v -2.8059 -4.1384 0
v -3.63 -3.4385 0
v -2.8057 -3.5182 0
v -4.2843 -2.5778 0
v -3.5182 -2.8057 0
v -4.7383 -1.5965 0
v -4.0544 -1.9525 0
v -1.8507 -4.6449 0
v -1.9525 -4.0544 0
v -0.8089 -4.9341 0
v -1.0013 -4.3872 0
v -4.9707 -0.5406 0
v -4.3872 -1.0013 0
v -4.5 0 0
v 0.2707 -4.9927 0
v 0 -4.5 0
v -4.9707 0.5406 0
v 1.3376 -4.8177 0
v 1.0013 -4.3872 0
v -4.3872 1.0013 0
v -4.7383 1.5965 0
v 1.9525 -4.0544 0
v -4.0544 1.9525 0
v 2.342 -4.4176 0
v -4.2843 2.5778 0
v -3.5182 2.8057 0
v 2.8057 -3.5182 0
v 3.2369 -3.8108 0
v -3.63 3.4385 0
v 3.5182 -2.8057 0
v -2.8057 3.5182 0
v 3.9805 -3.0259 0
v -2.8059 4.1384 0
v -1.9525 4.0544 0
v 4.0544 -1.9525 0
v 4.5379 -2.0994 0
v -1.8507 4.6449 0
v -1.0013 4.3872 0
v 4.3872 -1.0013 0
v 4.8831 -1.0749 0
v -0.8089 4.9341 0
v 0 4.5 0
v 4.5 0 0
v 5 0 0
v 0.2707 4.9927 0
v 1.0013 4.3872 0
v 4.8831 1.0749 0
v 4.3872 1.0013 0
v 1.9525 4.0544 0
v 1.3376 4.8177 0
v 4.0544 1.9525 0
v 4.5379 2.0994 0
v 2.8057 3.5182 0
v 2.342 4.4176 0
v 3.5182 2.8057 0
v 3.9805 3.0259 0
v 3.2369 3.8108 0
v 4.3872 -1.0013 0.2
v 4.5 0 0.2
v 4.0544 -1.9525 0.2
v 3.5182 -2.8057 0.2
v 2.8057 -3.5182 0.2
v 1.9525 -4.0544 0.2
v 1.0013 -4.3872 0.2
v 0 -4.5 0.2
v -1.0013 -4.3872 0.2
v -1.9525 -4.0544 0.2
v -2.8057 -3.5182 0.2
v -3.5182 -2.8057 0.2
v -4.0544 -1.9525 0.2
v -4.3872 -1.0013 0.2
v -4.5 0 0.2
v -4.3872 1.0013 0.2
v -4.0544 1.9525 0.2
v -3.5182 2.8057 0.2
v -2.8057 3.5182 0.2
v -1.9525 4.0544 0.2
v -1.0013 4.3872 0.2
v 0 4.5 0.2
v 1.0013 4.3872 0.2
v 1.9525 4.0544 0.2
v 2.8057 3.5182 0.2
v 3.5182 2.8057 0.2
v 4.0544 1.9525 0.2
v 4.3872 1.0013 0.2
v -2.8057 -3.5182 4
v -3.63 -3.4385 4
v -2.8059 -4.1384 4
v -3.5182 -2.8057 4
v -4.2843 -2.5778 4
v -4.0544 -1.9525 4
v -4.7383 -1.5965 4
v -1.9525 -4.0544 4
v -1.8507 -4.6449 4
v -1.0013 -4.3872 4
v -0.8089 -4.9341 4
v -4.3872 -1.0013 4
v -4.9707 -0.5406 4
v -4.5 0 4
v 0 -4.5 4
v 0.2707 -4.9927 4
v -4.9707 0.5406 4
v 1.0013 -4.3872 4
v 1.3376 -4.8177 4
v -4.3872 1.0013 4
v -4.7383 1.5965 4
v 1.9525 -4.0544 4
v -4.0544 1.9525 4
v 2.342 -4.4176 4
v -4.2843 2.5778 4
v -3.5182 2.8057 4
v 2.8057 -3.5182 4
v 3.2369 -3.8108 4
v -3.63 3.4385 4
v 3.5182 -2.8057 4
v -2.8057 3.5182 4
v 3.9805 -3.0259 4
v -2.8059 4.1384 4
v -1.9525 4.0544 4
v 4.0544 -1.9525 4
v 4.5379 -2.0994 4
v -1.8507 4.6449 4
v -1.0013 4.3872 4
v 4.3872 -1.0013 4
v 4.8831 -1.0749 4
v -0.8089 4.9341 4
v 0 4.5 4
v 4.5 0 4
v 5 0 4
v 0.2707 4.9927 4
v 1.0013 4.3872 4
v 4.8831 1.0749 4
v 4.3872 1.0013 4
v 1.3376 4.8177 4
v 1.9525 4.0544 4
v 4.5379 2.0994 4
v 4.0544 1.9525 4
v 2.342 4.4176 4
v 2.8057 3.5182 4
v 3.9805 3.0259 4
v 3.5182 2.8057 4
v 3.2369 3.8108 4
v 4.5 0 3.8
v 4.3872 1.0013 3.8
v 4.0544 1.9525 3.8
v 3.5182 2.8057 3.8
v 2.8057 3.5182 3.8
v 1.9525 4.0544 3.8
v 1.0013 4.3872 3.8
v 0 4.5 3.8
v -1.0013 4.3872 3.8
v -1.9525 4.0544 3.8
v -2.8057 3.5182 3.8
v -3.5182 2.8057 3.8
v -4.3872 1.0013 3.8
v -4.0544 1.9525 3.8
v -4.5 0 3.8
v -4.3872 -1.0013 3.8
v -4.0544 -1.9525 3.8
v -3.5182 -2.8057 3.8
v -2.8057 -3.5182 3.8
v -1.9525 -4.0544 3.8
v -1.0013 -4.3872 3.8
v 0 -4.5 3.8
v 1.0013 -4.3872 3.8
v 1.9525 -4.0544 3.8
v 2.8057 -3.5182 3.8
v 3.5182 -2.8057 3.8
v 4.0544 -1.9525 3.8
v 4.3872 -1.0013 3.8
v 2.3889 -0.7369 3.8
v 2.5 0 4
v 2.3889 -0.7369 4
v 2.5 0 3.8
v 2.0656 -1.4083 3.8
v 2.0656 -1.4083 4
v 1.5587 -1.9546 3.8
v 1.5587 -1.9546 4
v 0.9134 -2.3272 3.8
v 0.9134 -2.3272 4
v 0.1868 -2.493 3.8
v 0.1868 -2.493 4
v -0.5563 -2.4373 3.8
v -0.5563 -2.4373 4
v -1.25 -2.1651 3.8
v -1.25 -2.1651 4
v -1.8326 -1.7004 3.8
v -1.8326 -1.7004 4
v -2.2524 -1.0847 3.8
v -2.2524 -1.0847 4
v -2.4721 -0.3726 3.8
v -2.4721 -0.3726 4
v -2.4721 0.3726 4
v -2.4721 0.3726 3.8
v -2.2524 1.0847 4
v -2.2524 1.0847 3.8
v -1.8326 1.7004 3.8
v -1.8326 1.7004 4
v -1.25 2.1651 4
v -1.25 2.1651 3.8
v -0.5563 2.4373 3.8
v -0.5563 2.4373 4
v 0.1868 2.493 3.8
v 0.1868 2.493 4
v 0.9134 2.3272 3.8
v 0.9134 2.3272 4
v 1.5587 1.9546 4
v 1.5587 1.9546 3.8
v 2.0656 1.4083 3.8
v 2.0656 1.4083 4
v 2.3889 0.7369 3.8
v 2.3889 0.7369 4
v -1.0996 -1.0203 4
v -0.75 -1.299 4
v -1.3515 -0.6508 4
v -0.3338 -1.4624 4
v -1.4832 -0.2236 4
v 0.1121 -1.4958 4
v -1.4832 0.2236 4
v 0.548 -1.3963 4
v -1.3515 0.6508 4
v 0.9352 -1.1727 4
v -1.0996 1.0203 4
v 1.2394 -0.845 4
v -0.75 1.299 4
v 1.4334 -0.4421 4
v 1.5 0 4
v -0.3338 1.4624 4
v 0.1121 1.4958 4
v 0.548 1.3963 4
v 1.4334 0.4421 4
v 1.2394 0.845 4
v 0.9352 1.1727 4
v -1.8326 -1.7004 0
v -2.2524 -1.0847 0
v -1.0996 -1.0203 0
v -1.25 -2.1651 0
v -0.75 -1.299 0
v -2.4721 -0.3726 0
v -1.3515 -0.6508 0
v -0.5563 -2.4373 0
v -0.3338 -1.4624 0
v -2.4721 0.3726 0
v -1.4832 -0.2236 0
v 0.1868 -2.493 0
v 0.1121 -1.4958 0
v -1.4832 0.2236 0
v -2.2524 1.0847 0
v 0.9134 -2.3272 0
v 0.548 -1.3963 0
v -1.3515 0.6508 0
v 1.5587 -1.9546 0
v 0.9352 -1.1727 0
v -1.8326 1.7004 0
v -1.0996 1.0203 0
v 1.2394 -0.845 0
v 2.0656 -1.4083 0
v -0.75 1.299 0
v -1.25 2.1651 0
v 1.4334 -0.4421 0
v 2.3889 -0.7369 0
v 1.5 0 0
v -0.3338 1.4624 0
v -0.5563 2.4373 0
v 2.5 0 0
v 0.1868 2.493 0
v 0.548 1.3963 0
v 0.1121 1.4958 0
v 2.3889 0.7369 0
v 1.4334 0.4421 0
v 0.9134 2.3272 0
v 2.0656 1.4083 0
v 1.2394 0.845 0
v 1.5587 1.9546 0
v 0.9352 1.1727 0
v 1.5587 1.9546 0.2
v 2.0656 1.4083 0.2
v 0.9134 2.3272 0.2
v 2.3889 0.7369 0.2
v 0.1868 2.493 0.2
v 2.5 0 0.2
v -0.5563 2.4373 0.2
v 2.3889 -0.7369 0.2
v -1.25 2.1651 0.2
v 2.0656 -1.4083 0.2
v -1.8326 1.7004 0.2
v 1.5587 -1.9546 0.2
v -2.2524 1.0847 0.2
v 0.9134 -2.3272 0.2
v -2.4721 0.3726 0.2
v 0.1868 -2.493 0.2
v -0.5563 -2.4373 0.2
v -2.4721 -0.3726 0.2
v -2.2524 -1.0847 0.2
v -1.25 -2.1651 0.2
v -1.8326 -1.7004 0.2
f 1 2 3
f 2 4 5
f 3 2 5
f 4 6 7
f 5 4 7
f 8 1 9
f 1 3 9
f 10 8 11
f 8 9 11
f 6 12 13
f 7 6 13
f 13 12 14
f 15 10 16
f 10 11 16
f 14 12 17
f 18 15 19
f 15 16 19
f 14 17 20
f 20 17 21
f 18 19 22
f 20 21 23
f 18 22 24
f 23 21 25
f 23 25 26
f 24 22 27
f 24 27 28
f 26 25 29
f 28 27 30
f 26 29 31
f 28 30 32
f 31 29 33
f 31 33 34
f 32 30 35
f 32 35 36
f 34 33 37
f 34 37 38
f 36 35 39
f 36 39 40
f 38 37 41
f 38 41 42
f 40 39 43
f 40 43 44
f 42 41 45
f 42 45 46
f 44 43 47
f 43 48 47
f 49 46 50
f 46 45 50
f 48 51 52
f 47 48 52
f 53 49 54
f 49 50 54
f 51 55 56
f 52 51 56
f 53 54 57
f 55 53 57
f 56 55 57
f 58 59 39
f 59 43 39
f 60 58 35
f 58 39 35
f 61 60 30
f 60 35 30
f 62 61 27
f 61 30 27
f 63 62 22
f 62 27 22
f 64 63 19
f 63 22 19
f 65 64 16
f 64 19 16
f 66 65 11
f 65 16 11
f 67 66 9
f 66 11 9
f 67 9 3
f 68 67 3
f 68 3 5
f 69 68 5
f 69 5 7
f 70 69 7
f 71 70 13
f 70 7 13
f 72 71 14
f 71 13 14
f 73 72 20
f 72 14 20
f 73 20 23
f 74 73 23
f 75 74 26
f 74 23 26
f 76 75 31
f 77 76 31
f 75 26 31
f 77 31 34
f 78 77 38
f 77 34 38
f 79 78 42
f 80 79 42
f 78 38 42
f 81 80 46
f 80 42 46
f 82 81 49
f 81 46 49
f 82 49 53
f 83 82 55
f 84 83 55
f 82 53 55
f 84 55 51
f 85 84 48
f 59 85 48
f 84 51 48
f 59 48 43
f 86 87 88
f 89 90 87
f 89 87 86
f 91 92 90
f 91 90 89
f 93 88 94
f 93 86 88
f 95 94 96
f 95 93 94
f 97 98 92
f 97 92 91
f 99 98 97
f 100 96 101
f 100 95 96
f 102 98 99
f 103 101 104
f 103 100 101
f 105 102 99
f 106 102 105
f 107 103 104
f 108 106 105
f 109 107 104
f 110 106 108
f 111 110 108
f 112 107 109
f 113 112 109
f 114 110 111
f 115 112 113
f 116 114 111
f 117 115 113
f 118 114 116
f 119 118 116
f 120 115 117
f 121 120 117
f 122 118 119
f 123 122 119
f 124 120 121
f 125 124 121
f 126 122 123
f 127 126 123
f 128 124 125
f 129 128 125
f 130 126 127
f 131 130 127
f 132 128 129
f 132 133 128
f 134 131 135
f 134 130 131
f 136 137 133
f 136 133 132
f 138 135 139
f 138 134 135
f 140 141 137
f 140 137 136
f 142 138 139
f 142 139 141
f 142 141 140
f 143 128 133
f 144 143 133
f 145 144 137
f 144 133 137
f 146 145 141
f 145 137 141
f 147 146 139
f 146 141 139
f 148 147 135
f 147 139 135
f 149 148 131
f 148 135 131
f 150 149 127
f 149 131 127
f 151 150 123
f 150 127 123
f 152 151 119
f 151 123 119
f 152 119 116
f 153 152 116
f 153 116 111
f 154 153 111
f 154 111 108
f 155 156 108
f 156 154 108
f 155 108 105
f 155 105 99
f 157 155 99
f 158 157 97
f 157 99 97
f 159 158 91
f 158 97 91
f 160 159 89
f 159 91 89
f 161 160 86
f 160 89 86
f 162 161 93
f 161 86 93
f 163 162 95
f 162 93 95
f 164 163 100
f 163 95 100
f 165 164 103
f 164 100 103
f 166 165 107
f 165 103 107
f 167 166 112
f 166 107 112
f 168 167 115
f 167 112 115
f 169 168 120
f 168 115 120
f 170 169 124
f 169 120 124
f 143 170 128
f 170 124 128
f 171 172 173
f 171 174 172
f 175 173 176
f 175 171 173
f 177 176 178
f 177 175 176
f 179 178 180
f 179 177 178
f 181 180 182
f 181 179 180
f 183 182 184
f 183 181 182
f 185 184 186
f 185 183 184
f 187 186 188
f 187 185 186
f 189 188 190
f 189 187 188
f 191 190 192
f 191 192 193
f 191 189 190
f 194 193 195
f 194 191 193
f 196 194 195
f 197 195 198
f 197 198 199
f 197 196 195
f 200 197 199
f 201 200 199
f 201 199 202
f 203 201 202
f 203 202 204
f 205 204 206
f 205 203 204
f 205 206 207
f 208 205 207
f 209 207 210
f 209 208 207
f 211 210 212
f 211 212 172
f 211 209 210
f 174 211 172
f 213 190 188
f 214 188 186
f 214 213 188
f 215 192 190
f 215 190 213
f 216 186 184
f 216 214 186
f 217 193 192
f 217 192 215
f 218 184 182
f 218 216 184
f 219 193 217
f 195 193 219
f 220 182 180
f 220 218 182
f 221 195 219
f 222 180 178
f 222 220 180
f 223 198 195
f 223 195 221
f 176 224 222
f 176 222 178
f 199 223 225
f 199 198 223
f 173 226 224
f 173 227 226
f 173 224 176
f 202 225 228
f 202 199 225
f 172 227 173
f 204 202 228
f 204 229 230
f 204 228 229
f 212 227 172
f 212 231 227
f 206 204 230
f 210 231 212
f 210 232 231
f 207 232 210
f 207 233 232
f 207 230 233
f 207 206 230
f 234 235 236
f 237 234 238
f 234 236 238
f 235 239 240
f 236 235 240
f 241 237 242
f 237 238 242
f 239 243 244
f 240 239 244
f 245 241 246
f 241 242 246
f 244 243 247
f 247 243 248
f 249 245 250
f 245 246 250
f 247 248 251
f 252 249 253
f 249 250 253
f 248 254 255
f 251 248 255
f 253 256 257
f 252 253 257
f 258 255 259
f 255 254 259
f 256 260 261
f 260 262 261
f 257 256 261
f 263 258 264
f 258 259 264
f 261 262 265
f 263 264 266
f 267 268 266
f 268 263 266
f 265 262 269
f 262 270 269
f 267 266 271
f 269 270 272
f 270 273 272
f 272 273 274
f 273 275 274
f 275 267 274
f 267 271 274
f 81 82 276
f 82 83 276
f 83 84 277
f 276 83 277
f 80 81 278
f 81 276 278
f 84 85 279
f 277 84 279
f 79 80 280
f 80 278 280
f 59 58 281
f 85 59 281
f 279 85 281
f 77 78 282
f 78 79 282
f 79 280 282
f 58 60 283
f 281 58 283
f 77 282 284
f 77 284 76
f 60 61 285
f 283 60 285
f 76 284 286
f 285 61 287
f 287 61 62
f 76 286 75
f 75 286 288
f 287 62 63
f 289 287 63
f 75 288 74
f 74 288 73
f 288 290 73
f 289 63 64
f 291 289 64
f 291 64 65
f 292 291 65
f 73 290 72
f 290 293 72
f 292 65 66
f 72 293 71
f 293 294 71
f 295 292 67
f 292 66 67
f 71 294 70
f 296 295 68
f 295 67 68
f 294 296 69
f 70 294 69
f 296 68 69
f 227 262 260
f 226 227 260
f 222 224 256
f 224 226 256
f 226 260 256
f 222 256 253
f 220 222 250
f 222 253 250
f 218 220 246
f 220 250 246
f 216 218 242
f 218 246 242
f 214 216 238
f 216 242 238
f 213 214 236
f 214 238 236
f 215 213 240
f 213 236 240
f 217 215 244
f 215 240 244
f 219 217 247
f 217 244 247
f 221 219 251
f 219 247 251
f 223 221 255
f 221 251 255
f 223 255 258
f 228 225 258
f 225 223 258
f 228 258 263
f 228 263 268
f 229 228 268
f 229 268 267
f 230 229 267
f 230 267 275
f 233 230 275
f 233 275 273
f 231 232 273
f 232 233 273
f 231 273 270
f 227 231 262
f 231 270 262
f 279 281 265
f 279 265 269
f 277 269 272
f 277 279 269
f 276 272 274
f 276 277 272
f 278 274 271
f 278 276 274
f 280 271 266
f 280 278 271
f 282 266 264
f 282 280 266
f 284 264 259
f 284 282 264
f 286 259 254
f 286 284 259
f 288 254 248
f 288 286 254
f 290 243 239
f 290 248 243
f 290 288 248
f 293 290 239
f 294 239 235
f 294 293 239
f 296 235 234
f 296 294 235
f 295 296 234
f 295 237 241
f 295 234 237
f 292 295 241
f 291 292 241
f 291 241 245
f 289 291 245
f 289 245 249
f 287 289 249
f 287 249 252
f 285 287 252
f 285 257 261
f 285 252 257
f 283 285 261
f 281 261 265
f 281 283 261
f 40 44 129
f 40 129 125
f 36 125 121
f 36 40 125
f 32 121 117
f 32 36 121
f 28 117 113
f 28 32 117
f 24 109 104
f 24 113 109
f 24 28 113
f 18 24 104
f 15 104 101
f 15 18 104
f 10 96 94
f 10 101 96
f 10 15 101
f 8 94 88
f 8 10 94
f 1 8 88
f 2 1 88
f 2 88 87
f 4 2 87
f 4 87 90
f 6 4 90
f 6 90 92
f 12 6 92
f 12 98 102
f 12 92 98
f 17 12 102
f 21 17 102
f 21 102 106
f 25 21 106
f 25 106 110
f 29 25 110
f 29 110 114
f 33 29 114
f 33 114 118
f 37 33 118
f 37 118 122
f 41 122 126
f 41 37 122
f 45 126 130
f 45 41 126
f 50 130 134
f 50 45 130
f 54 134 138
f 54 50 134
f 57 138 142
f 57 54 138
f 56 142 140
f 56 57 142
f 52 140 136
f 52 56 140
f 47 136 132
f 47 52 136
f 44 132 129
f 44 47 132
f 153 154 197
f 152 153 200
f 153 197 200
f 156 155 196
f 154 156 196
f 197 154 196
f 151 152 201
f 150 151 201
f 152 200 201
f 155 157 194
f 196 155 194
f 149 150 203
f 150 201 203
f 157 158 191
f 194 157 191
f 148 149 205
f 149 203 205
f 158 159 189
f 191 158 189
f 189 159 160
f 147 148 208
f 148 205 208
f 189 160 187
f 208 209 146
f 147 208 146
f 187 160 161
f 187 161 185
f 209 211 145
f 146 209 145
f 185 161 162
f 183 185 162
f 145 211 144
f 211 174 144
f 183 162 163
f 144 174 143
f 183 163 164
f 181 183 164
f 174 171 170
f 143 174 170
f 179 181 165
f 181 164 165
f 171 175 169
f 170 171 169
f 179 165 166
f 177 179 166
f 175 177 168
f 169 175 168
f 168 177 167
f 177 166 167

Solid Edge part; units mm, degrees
sketch "Sketch1" plane through (0, 0, 0) normal (0, 0, 1) x (1, 0, 0)
  circle A0 centre (0, 0) radius 1.5
  circle A1 centre (0, 0) radius 5
  dimension "D1" = 10
extrude "Protrusion1" add sketch "Sketch1" along normal blind 4
sketch "Sketch2" plane through (0, 0, 0) normal (0, -1, 0) x (1, 0, 0)
  line L0 (0, 4) -> (2.5, 4)
  line L1 (2.5, 4) -> (2.5, 3.8)
  line L2 (2.5, 3.8) -> (4.5, 3.8)
  line L3 (4.5, 3.8) -> (4.5, 4)
  line L4 (4.5, 4) -> (5.6166, 4)
revolve "RevolvedCutout1" cut sketch "Sketch2" angle 360 about axis through (0, 0, 54) along (0, 0, -1) material side at (1.25, 0, 4.05)
mirror "Mirror1" about plane through (0, 0, 2) normal (0, 0, 1) of "RevolvedCutout1"
properties material "Stainless steel"
